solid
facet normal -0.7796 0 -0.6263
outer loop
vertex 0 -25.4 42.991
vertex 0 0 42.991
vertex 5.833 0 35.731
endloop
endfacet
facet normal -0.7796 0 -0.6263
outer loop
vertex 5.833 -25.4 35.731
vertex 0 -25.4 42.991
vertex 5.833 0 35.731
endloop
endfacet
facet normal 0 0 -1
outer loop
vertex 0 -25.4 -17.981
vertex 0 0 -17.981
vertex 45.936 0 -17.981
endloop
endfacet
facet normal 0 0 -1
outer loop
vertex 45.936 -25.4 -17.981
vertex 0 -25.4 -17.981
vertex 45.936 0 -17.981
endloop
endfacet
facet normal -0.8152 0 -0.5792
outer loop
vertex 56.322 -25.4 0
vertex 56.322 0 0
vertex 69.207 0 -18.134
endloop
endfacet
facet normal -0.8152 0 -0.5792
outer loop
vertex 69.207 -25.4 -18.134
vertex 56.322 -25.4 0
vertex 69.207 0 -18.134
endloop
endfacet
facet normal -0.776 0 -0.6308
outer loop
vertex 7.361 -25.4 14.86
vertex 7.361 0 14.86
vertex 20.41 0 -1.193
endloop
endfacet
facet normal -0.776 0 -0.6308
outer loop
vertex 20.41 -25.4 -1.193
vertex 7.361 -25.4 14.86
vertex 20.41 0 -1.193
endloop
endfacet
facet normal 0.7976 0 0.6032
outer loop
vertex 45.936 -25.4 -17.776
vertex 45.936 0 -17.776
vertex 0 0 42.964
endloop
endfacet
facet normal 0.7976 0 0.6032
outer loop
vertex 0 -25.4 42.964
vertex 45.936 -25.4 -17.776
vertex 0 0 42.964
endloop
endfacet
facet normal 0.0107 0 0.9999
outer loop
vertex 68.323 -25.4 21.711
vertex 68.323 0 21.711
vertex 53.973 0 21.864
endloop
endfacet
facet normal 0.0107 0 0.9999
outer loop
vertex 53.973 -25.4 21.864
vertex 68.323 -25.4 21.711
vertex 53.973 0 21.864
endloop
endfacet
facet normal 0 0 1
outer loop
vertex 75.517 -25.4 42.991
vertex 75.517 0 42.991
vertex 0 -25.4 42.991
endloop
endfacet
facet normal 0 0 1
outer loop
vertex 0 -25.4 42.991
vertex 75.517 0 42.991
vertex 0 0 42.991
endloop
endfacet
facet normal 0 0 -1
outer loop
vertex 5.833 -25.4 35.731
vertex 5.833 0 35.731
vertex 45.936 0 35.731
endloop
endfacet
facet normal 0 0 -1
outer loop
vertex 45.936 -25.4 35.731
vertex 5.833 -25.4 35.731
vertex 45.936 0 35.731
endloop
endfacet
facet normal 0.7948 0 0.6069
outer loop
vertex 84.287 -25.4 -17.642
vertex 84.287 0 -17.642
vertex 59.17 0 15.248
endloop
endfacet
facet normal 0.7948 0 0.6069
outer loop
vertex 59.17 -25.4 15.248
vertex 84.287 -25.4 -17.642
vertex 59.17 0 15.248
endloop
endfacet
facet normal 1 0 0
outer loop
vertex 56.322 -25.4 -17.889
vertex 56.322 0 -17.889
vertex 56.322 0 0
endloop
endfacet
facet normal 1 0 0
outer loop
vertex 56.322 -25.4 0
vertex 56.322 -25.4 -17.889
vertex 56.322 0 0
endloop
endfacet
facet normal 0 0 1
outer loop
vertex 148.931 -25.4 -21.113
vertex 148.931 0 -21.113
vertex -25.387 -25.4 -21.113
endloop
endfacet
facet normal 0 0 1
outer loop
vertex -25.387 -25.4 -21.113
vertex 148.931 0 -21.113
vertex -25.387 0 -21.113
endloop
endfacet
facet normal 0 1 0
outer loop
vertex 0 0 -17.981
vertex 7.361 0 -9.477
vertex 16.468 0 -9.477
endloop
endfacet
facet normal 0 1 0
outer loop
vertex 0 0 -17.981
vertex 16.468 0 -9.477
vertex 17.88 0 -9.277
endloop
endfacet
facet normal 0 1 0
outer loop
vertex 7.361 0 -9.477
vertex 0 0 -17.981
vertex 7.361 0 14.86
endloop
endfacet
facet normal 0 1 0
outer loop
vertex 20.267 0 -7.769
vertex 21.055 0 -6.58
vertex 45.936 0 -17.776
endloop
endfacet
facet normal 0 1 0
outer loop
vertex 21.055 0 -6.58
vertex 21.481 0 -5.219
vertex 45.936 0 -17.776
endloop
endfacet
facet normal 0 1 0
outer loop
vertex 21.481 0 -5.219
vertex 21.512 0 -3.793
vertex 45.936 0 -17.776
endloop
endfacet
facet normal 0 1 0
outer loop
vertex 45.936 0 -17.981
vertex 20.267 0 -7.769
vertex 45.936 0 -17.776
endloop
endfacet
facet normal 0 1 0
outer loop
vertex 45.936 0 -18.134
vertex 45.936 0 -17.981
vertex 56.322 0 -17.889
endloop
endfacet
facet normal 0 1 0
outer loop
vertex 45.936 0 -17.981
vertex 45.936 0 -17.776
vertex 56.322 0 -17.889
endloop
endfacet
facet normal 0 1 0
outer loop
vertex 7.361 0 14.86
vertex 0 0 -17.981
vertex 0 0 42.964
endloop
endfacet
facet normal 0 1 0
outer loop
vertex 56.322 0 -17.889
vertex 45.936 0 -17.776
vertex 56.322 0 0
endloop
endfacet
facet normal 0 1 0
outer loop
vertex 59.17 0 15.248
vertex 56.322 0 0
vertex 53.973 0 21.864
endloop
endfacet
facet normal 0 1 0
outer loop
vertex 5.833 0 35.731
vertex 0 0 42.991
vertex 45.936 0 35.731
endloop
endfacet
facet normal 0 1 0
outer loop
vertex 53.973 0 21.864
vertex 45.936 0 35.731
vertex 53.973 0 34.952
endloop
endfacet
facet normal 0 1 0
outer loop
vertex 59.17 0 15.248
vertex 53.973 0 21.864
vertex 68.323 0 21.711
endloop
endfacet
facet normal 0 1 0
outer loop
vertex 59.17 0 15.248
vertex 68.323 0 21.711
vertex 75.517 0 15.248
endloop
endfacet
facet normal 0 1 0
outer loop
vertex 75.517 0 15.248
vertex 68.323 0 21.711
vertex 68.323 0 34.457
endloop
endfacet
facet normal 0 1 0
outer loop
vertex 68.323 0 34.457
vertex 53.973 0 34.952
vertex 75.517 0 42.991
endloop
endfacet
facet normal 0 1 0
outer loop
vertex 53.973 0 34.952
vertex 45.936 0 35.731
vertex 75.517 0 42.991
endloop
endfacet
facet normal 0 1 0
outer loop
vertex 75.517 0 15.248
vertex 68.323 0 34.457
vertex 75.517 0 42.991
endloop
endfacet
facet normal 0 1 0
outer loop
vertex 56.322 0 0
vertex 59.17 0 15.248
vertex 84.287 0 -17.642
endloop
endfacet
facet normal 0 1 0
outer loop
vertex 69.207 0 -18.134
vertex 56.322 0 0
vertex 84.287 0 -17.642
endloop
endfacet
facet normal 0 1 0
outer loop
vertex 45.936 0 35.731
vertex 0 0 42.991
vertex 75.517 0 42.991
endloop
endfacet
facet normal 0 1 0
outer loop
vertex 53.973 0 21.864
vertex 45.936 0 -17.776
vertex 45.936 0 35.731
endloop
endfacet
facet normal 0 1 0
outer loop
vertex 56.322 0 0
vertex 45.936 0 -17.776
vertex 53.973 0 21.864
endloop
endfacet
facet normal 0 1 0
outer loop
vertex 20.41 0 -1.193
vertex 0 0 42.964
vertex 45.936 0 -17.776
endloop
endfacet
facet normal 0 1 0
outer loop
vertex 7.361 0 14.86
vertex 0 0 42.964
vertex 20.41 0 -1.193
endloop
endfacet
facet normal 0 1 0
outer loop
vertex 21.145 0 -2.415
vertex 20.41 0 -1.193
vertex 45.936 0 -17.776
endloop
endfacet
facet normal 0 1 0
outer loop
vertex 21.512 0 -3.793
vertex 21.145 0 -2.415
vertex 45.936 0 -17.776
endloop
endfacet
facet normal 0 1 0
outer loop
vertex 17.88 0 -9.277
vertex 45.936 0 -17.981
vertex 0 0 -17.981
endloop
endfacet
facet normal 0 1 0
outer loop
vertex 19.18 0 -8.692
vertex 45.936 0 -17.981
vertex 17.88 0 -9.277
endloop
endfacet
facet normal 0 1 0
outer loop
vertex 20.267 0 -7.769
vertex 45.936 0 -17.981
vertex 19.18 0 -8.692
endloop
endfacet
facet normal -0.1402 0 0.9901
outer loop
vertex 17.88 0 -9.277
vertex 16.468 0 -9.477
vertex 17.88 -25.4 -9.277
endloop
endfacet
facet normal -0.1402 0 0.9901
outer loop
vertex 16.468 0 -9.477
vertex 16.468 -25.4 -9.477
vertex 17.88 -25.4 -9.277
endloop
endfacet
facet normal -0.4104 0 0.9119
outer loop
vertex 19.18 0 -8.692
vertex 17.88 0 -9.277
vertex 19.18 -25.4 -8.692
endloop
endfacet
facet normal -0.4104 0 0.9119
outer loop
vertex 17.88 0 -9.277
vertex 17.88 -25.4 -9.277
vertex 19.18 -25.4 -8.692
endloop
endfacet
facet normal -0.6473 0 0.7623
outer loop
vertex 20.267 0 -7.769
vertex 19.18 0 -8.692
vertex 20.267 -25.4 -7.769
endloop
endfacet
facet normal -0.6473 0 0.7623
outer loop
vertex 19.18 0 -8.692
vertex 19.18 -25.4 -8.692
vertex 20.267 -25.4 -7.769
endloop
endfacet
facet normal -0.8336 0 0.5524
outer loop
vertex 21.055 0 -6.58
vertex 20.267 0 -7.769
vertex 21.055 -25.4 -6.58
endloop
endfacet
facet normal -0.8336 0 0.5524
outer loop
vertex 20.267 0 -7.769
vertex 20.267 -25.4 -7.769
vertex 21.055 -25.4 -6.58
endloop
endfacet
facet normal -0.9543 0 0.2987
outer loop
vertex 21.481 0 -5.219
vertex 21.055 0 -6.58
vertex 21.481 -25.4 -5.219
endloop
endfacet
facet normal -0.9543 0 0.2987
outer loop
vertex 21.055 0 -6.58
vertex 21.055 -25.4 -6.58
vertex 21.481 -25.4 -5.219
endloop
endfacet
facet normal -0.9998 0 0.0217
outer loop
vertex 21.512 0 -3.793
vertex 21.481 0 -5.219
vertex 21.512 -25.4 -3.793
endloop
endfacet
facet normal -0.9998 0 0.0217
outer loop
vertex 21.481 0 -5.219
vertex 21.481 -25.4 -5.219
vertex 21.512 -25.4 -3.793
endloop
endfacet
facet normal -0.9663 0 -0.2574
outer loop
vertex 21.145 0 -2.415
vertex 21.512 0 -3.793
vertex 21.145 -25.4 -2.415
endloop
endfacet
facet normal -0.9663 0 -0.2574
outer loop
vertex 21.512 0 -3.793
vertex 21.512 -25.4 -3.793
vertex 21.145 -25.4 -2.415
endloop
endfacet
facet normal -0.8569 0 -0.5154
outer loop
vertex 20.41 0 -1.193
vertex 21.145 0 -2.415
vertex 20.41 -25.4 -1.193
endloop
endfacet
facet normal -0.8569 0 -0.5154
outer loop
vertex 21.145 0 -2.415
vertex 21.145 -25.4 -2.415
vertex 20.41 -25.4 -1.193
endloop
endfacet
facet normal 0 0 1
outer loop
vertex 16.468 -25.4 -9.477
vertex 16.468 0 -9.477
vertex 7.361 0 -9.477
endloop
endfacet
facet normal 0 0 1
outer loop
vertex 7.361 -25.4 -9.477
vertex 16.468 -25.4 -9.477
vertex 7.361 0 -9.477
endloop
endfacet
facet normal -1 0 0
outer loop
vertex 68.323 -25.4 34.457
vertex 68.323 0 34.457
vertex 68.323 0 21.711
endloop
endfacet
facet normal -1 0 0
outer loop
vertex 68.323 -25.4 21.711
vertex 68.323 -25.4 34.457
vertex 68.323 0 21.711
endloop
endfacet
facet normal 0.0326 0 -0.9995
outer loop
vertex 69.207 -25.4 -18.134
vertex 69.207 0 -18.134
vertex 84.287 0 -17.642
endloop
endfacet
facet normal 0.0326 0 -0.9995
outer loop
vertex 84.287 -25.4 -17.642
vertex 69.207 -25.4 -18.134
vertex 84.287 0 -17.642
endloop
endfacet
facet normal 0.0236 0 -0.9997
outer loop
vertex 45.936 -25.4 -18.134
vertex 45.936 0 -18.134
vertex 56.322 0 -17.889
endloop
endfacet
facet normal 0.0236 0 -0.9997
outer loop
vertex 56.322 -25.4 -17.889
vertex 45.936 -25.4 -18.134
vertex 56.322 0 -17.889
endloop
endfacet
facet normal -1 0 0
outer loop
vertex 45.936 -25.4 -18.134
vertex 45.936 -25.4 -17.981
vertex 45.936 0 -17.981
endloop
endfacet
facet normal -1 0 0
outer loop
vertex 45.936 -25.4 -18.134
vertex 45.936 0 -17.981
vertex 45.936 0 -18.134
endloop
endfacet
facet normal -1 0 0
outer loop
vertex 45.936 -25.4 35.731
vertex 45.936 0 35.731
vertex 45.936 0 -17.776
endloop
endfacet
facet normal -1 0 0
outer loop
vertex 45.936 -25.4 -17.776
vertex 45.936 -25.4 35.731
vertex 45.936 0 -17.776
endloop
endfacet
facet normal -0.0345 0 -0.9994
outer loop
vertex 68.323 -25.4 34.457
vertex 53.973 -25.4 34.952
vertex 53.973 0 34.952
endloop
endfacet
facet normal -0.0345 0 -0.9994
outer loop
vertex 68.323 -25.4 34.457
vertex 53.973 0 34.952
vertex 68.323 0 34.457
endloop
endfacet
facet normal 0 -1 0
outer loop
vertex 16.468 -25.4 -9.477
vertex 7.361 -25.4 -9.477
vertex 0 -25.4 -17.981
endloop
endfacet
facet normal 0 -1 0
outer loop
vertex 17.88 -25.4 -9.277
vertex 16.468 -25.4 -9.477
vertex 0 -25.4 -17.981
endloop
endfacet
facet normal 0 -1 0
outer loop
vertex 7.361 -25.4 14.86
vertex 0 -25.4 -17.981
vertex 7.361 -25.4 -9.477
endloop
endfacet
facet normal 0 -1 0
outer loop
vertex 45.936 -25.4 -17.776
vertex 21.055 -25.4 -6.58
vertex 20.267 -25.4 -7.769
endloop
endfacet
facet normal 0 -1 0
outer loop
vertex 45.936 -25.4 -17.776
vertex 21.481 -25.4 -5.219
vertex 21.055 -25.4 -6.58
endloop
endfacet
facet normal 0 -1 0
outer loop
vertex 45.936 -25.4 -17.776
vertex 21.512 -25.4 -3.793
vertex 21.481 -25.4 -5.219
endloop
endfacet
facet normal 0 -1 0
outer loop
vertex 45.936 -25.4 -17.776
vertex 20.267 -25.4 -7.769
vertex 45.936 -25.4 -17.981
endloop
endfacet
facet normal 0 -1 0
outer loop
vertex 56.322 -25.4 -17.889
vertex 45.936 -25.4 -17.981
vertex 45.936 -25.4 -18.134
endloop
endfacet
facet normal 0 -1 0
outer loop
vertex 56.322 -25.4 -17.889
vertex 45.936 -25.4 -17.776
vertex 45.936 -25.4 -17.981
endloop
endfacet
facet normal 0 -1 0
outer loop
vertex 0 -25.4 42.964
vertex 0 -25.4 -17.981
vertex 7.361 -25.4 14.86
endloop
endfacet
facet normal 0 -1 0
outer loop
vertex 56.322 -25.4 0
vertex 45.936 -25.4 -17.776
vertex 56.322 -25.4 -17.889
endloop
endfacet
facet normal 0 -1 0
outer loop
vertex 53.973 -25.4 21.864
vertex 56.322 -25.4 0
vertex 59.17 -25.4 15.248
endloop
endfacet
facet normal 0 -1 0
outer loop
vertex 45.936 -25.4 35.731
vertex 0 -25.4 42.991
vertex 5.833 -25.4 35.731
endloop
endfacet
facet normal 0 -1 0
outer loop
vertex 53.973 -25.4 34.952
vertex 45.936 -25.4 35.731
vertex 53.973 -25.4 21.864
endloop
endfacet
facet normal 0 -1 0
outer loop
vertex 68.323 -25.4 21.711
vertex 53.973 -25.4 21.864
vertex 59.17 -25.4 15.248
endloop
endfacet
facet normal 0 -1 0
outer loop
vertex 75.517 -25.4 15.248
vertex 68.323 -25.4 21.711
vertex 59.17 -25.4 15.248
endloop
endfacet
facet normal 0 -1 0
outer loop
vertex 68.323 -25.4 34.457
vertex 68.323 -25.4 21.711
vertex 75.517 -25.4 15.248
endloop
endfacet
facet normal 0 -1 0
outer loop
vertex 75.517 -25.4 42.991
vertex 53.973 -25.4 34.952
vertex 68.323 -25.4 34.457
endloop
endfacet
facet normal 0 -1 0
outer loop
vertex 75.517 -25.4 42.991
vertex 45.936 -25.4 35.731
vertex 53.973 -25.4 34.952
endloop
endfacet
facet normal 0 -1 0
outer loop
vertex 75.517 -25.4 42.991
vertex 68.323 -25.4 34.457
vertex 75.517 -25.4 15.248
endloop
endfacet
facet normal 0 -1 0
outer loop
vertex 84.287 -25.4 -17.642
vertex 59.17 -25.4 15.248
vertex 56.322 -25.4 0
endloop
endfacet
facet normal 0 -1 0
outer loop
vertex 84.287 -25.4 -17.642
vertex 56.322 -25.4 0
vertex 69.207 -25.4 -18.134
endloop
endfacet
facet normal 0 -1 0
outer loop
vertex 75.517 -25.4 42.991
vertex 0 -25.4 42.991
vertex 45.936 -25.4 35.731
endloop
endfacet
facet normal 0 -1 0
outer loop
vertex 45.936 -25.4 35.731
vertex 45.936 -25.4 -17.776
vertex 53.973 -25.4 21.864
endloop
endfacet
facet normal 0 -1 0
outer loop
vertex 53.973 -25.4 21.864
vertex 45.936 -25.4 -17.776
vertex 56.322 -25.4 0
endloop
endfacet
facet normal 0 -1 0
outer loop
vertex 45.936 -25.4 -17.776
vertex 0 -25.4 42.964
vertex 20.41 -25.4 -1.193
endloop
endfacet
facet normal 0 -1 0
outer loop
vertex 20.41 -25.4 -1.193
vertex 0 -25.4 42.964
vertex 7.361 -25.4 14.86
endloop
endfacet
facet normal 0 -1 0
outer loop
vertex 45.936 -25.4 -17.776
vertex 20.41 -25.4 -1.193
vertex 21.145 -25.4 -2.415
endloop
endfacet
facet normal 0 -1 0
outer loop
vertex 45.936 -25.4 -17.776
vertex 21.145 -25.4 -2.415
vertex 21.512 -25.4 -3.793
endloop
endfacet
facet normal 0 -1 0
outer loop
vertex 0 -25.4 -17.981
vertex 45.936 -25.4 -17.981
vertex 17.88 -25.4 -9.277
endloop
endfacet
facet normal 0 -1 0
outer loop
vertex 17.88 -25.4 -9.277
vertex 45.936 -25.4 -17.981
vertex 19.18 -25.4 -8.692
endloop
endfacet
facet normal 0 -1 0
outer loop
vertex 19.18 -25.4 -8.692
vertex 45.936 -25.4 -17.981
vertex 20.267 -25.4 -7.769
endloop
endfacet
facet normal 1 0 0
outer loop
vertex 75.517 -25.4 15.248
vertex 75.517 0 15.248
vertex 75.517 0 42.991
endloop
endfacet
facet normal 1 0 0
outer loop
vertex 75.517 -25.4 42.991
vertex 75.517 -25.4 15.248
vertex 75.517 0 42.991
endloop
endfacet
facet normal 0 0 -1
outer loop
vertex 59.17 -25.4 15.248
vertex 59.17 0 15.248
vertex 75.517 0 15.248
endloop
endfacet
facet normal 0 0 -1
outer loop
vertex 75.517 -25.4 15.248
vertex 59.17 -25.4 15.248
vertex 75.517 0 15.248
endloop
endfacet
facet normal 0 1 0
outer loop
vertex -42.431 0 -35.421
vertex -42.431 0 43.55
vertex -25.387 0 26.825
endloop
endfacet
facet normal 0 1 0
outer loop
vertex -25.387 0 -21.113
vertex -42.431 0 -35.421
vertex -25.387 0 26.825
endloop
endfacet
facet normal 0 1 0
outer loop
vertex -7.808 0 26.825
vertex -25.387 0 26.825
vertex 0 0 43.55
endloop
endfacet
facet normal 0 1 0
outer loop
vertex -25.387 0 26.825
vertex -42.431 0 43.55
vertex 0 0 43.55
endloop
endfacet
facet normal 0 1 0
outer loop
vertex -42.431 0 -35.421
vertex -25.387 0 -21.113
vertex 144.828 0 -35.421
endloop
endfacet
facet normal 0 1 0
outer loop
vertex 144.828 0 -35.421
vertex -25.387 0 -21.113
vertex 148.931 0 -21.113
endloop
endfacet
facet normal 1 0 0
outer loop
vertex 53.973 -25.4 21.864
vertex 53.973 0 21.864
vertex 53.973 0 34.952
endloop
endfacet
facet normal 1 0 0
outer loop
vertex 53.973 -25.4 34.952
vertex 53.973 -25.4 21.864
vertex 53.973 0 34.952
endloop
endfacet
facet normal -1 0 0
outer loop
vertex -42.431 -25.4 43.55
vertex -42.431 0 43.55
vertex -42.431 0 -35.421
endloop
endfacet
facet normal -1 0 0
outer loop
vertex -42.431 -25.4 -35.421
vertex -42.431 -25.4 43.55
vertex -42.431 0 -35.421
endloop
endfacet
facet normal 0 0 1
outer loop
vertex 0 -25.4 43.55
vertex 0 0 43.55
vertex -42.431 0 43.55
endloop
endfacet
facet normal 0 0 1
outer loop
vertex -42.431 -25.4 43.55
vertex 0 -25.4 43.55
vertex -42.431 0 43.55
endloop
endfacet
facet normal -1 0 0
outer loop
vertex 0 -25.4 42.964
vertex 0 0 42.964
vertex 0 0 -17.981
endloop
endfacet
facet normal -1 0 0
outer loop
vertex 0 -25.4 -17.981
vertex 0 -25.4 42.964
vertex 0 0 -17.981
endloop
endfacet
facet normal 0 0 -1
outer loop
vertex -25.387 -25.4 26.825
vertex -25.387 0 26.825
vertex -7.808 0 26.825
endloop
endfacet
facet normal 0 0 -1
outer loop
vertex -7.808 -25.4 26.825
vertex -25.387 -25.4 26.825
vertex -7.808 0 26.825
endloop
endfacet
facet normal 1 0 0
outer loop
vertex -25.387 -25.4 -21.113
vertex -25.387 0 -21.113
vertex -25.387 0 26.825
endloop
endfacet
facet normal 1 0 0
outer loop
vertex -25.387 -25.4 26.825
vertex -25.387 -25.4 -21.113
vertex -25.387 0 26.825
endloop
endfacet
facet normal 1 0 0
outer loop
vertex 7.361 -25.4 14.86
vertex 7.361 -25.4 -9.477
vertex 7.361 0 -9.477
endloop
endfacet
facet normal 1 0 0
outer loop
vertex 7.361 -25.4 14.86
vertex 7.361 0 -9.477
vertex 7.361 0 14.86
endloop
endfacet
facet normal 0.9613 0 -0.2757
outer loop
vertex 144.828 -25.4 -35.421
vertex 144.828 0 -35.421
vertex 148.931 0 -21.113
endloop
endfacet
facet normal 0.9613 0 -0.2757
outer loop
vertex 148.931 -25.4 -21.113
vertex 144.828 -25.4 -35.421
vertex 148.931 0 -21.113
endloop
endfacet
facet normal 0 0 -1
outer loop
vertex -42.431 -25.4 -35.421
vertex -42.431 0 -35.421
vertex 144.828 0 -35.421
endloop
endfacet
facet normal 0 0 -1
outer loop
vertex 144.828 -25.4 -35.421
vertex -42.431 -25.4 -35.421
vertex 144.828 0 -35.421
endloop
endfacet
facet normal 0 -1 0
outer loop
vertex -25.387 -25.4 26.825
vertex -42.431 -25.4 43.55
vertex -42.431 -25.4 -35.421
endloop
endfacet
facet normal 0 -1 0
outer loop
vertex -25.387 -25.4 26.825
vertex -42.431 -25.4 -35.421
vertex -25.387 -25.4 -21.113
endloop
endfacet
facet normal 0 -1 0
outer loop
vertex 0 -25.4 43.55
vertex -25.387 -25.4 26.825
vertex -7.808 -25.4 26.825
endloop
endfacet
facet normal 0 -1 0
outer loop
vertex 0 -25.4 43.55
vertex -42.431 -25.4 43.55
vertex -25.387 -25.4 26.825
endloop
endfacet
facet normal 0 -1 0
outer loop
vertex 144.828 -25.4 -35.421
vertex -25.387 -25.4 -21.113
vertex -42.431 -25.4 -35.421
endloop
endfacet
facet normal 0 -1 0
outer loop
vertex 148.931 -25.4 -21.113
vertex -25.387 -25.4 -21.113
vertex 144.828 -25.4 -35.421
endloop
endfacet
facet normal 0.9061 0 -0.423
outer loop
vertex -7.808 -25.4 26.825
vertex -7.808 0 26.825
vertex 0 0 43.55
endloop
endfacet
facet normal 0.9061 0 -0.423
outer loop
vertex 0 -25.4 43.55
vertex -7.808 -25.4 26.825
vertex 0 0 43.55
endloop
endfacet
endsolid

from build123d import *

# Parameters (mm, degrees)
F3_DEPTH = 25.4
F4_DEPTH = 25.4
F5_DEPTH = 25.4
F6_R     = 5.08


with BuildPart() as f3:
    # F0 (on Front) → F3 (new body)
    with BuildSketch(Plane.XZ):
        Polygon((-7.808386, 26.825462), (0, 43.550406), (-27.999483, 43.550406), (-42.430881, 43.550406), (-42.430881, -15.979119), (-42.430881, -35.421416), (-8.757614, -35.421416), (38.21101, -35.421416), (92.245594, -35.421416), (144.827515, -35.421416), (148.93125, -21.11293), (0, -21.11293), (-14.712937, -21.11293), (-25.38706, -21.11293), (-25.38706, 26.825462), align=None)
    extrude(amount=F3_DEPTH)


with BuildPart() as f4:
    # F1 (on Front) → F4 (new body)
    with BuildSketch(Plane.XZ):
        Polygon((46.090808, -17.981157), (0, 42.963523), (0, -17.981157), align=None)
        Polygon((7.360607, -9.477388), (7.360607, 14.859715), (27.143788, -9.477388), align=None, mode=Mode.SUBTRACT)
    extrude(amount=F4_DEPTH)

    # F2 (on Front) → F5 (join)
    with BuildSketch(Plane.XZ):
        Polygon((45.936029, 31.041037), (45.936029, -18.133938), (56.322422, -17.889425), (56.322422, 0), (69.206849, -18.133938), (84.287159, -17.641924), (59.169777, 15.247826), (75.517356, 15.247826), (75.517356, 19.100886), (75.517356, 42.991243), (0, 42.991243), (5.832698, 35.730619), (45.936029, 35.730619), align=None)
        Polygon((53.972501, 21.863677), (53.972501, 34.952052), (68.323299, 34.457304), (68.323299, 21.710936), align=None, mode=Mode.SUBTRACT)
    extrude(amount=F5_DEPTH)

    # F6
    f6_edges = [f4.edges().sort_by_distance(p)[0] for p in [
        (27.143788, -12.7, -9.477388),
    ]]
    fillet(f6_edges, radius=F6_R)


solid = Compound([f3.part, f4.part])
